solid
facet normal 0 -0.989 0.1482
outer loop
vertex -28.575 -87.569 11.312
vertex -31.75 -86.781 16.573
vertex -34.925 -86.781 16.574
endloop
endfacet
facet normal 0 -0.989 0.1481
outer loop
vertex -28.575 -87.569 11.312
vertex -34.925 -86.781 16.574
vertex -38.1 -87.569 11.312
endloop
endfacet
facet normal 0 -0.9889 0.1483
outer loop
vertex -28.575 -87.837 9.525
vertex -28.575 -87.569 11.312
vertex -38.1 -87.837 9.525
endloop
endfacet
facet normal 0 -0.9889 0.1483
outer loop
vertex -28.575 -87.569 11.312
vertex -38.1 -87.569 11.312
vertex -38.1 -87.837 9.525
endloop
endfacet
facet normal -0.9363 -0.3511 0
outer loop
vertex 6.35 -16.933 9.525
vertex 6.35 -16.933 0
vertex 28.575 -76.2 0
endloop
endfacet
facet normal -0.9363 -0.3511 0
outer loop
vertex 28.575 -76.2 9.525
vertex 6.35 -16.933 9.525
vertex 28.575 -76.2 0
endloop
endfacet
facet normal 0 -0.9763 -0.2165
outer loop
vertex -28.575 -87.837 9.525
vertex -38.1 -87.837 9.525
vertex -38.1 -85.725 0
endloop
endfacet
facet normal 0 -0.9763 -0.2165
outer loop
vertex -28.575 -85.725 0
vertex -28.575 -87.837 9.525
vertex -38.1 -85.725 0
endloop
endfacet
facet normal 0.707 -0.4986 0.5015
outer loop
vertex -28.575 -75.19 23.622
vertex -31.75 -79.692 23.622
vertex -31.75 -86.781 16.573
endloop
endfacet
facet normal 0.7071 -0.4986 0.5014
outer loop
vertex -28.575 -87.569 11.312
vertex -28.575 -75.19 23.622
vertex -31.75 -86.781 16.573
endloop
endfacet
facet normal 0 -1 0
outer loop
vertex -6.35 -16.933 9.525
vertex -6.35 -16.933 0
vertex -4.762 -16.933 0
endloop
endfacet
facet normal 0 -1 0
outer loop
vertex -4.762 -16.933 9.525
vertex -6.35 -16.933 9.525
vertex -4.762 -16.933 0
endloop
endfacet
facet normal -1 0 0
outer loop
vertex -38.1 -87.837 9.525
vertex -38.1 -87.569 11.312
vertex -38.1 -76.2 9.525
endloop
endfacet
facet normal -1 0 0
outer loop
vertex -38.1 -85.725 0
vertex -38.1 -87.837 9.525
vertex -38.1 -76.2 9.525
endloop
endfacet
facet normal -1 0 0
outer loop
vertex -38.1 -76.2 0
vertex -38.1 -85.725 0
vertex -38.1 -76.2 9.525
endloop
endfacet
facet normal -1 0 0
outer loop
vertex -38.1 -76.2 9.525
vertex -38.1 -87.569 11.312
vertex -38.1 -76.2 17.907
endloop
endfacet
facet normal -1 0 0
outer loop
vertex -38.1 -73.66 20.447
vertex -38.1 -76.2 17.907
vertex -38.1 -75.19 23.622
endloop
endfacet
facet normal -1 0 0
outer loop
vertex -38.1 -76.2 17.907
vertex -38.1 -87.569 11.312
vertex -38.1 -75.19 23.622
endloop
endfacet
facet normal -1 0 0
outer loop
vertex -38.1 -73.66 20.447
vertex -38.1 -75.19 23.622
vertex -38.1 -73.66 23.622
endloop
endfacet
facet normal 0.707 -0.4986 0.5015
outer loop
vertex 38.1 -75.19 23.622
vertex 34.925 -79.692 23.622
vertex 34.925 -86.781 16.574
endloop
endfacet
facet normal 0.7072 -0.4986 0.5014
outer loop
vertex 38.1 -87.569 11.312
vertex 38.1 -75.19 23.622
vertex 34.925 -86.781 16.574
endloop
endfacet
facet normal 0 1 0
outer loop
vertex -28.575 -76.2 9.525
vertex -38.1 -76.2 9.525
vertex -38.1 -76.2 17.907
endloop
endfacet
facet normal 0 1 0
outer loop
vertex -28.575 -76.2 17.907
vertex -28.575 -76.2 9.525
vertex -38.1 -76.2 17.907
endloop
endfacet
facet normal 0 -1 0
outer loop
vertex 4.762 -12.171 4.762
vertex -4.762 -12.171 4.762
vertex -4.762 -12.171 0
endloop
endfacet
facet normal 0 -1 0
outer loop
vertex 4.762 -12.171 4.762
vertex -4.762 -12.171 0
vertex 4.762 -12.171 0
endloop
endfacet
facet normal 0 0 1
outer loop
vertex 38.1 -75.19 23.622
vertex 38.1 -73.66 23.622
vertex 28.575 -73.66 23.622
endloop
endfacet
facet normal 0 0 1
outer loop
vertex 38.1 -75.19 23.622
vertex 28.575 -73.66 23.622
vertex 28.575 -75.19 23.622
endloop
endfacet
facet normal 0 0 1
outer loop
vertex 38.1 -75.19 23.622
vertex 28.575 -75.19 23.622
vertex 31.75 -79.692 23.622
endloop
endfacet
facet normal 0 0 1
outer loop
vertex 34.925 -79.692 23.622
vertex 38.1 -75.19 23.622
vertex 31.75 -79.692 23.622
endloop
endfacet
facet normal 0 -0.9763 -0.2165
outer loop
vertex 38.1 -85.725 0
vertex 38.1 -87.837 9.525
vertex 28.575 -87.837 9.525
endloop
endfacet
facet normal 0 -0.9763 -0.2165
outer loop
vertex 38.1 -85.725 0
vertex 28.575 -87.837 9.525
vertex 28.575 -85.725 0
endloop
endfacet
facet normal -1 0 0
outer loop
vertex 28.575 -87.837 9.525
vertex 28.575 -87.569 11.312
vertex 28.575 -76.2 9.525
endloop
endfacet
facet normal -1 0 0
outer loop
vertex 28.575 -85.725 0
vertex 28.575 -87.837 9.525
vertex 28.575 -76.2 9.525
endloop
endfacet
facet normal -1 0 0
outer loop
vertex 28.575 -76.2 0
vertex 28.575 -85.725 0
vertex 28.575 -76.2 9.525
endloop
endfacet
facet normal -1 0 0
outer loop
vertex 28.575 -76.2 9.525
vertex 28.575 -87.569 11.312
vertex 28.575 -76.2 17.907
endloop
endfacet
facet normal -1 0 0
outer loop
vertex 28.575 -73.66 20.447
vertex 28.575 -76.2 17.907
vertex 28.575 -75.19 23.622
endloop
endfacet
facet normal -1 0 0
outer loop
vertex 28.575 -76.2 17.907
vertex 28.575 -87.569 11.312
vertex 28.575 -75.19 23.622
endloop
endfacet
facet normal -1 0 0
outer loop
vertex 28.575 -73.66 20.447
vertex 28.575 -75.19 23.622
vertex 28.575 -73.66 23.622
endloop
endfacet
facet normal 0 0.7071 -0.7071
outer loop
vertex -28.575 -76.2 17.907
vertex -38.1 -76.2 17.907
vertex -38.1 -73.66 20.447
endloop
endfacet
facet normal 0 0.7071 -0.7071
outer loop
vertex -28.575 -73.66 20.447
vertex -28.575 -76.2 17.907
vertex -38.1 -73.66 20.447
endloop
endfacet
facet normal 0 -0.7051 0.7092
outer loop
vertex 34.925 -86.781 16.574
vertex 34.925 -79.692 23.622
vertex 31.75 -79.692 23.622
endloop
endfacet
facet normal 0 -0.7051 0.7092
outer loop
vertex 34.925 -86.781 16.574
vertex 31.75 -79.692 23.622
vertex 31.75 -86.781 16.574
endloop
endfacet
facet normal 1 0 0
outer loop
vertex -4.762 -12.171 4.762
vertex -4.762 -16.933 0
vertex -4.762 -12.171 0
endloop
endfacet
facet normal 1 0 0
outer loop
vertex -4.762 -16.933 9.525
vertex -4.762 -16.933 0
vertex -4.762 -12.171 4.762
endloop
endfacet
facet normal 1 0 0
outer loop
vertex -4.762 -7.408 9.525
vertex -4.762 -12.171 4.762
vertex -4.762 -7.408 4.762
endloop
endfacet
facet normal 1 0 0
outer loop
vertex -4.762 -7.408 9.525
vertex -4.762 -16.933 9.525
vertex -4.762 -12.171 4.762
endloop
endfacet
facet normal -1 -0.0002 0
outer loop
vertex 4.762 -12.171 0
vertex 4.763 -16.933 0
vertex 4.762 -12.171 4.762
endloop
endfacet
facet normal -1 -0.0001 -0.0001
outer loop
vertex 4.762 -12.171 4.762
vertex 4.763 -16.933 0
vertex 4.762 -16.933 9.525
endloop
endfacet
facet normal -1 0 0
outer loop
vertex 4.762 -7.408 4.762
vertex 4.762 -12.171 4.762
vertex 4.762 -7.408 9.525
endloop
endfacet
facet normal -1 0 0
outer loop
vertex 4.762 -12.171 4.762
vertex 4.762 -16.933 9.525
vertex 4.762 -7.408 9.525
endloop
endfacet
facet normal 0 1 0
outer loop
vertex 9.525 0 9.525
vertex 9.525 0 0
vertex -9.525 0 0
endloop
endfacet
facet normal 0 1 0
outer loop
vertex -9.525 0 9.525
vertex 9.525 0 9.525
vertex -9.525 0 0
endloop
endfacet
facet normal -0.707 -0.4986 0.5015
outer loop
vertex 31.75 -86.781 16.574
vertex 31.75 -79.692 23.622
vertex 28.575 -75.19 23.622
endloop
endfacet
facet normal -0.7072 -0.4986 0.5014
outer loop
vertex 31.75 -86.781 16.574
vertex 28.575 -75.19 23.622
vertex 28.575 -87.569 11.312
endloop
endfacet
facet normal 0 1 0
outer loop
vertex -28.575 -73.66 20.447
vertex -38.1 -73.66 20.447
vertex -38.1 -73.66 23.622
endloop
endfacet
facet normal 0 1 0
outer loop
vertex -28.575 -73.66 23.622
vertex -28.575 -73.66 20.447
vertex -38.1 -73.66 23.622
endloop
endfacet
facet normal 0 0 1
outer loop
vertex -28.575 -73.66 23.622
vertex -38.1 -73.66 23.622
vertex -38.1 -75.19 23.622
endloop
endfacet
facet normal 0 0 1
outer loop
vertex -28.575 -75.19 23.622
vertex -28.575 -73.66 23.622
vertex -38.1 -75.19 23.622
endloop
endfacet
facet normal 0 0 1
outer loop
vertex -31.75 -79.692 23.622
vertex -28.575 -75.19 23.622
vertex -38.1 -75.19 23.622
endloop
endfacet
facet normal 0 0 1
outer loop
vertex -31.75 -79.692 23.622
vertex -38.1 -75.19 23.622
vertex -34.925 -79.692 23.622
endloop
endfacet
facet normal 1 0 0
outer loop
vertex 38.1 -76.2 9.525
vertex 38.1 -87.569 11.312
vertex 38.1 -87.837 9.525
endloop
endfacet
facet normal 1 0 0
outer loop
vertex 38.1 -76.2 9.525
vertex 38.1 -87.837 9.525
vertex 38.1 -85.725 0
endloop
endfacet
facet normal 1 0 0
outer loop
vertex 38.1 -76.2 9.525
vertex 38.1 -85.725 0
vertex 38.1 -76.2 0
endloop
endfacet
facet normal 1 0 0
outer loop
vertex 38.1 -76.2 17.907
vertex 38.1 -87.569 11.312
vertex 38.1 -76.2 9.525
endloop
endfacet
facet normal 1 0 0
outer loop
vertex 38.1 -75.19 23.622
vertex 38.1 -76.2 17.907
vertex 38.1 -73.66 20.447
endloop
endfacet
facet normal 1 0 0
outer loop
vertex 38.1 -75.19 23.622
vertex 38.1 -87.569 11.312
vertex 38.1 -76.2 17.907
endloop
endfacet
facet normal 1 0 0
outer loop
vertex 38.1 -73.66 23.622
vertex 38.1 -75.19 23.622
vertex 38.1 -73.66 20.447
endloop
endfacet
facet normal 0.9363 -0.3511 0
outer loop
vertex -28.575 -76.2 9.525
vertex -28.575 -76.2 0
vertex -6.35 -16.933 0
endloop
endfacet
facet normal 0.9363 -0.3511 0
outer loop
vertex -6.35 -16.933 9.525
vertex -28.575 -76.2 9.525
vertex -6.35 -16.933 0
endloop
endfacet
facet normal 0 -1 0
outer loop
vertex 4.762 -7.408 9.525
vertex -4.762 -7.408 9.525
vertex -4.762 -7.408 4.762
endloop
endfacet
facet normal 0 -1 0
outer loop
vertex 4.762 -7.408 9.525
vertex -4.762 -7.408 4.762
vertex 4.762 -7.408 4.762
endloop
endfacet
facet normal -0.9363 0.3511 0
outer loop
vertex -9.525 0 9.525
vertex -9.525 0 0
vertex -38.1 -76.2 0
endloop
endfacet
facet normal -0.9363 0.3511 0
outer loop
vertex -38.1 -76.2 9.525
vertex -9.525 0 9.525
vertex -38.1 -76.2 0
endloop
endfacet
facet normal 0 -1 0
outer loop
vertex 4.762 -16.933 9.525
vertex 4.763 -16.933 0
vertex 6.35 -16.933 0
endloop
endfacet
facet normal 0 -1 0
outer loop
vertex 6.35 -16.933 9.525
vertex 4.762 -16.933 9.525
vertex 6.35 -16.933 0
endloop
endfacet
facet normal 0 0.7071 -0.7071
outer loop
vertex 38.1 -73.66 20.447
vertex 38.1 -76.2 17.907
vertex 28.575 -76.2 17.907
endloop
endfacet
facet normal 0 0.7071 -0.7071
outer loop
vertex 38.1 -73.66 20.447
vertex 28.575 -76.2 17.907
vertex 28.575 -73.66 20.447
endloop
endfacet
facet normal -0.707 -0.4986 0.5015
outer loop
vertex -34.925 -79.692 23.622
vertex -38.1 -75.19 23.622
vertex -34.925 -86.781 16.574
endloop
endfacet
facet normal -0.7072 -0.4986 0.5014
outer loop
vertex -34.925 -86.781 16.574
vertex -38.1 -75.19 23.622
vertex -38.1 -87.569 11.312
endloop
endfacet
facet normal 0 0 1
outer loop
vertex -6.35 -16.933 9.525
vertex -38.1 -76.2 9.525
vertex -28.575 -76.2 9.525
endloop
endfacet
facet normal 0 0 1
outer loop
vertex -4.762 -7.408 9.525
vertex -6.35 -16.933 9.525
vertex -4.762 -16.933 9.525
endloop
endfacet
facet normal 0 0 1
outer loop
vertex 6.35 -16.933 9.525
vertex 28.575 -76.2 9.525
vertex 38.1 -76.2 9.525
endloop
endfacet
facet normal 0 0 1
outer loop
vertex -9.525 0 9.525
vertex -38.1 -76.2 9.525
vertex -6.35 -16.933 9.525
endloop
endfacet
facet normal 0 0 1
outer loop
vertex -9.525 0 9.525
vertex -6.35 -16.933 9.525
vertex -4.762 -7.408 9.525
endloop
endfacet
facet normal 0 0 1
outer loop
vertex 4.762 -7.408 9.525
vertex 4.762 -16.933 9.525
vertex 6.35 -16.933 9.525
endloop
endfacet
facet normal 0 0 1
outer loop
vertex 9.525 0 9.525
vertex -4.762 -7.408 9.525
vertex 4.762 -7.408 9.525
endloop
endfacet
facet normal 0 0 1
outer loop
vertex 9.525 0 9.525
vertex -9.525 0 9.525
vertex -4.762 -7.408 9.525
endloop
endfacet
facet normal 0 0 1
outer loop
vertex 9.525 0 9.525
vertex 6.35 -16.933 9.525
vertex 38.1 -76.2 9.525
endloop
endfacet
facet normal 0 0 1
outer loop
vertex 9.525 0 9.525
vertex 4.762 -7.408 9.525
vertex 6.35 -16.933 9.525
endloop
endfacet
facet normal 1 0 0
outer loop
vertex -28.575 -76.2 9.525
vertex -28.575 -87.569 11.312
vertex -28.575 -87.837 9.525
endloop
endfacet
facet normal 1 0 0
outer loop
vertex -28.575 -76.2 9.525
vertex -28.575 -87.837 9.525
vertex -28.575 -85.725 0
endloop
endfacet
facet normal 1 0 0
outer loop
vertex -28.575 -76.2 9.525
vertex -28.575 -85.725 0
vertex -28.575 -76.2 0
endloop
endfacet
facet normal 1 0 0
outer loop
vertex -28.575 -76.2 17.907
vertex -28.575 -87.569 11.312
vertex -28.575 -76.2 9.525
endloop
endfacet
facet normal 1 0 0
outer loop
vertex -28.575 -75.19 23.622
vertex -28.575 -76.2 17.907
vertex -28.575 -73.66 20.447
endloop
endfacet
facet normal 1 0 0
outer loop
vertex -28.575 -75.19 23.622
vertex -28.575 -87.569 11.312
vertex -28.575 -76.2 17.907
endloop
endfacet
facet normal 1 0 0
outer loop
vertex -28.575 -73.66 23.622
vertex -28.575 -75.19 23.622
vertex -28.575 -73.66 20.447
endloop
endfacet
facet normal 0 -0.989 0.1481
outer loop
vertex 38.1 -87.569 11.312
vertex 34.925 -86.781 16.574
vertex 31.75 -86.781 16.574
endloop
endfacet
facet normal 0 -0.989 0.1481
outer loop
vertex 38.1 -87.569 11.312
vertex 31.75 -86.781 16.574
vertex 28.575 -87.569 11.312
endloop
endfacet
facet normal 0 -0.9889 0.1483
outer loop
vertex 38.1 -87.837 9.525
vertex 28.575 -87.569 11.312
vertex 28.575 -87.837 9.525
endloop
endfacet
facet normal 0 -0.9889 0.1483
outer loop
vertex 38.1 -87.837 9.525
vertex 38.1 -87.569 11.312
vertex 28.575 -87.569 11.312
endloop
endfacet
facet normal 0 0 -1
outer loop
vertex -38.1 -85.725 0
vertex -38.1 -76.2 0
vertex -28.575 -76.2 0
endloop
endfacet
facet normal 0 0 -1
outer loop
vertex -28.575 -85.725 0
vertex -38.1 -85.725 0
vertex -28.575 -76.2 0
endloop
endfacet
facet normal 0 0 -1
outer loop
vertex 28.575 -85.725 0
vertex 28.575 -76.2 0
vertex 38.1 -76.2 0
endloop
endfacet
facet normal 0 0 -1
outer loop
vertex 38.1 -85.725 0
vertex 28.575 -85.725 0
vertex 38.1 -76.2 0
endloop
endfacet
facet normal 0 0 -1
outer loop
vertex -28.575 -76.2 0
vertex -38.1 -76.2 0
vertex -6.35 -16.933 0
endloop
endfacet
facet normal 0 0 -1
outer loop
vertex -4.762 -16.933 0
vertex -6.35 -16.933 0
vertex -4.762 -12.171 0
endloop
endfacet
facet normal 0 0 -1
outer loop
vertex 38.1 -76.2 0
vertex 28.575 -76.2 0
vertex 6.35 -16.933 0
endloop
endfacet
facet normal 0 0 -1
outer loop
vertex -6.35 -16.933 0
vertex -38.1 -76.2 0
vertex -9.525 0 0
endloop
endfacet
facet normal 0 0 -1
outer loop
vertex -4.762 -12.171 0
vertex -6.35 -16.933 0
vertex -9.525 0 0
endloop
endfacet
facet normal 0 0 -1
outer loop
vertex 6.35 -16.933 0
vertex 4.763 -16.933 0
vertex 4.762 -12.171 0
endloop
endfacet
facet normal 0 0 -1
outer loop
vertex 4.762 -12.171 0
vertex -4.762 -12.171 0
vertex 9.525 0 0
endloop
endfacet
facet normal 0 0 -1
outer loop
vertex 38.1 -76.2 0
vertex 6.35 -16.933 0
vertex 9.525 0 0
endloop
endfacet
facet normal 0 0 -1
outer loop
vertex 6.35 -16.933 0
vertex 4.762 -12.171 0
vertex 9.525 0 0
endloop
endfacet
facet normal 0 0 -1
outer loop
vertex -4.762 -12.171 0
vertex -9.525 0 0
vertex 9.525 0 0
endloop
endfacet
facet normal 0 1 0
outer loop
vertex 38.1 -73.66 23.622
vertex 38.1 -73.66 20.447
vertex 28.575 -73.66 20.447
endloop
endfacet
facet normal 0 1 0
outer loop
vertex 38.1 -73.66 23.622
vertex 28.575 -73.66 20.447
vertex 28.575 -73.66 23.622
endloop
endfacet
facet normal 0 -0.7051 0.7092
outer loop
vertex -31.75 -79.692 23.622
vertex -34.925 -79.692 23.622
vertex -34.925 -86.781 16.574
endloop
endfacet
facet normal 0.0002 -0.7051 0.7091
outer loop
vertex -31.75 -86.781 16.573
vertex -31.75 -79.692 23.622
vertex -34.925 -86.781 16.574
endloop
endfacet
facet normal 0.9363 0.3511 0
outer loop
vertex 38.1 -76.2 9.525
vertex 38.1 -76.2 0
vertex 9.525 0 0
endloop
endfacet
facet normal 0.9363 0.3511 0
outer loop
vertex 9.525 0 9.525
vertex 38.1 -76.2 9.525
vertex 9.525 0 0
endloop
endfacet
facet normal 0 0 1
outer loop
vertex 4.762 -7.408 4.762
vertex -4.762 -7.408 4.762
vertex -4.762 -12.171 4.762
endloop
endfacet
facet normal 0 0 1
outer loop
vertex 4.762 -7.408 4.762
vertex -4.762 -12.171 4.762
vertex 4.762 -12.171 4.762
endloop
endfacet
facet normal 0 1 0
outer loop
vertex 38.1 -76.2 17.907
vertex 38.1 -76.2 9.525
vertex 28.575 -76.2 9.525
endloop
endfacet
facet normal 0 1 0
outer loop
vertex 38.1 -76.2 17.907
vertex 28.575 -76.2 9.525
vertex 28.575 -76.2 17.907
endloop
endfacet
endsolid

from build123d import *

# Parameters (mm, degrees)
F1_DEPTH = 9.525
F3_DEPTH = 9.525
F4_W     = 9.525
F4_H     = 9.525
F5_DEPTH = 4.7625
F6_W     = 9.525
F6_H     = 4.7625
F7_DEPTH = 4.7635
F8_SIZE  = 3.175


# Not quite as in the source:
# - a pattern or mirror of a feature is missing from the dataset's text; its kind, count and spacing are read off the source's solid


with BuildPart() as f1:
    # F0 (on Top) → F1 (new body)
    with BuildSketch(Plane.XY):
        Polygon((9.525, 0), (0, 0), (-9.525, 0), (-38.1, -76.2), (-38.1, -85.725), (-28.575, -85.725), (-28.575, -76.2), (-6.35, -16.9333333333), (0, -16.9333333333), (6.35, -16.9333333333), (28.575, -76.2), (28.575, -85.725), (38.1, -85.725), (38.1, -76.2), align=None)
    extrude(amount=F1_DEPTH)

    # F2 (on face) → F3 (join)
    with BuildSketch(Plane.YZ.offset(38.1)):
        Polygon((-85.725, 9.525), (-76.2, 9.525), (-76.2, 17.907), (-76.2, 20.447), (-73.66, 20.447), (-73.66, 23.622), (-79.6925, 23.622), (-86.7808208308, 16.5735), (-87.8366416617, 9.525), (-85.725, 0), align=None)
        Polygon((-76.2, 20.447), (-76.2, 17.907), (-73.66, 20.447), align=None)
    f3 = extrude(amount=-F3_DEPTH)

    # F3_copies: F3 across plane
    add(f3.mirror(Plane(origin=(0, 0, 0), x_dir=(0, 0, -1), z_dir=(-1, 0, 0))))

    # F4 (on face) → F5 (cut)
    with BuildSketch(Plane.XY.offset(9.525)):
        with Locations((0, -12.1708333333)):
            Rectangle(F4_W, F4_H)
    extrude(amount=-F5_DEPTH, mode=Mode.SUBTRACT)

    # F6 (on face) → F7 (cut, through all)
    with BuildSketch(Plane.XY.offset(4.7625)):
        with Locations((0, -14.5520833333)):
            Rectangle(F6_W, F6_H)
    extrude(amount=-F7_DEPTH, mode=Mode.SUBTRACT)

    # F8
    f8_edges = [f1.edges().sort_by_distance(p)[0] for p in [
        (38.1, -83.23666, 20.09775),
        (28.575, -83.23666, 20.09775),
        (-38.1, -83.23666, 20.09775),
        (-28.575, -83.23666, 20.09775),
    ]]
    chamfer(f8_edges, length=F8_SIZE)


solid = f1.part
